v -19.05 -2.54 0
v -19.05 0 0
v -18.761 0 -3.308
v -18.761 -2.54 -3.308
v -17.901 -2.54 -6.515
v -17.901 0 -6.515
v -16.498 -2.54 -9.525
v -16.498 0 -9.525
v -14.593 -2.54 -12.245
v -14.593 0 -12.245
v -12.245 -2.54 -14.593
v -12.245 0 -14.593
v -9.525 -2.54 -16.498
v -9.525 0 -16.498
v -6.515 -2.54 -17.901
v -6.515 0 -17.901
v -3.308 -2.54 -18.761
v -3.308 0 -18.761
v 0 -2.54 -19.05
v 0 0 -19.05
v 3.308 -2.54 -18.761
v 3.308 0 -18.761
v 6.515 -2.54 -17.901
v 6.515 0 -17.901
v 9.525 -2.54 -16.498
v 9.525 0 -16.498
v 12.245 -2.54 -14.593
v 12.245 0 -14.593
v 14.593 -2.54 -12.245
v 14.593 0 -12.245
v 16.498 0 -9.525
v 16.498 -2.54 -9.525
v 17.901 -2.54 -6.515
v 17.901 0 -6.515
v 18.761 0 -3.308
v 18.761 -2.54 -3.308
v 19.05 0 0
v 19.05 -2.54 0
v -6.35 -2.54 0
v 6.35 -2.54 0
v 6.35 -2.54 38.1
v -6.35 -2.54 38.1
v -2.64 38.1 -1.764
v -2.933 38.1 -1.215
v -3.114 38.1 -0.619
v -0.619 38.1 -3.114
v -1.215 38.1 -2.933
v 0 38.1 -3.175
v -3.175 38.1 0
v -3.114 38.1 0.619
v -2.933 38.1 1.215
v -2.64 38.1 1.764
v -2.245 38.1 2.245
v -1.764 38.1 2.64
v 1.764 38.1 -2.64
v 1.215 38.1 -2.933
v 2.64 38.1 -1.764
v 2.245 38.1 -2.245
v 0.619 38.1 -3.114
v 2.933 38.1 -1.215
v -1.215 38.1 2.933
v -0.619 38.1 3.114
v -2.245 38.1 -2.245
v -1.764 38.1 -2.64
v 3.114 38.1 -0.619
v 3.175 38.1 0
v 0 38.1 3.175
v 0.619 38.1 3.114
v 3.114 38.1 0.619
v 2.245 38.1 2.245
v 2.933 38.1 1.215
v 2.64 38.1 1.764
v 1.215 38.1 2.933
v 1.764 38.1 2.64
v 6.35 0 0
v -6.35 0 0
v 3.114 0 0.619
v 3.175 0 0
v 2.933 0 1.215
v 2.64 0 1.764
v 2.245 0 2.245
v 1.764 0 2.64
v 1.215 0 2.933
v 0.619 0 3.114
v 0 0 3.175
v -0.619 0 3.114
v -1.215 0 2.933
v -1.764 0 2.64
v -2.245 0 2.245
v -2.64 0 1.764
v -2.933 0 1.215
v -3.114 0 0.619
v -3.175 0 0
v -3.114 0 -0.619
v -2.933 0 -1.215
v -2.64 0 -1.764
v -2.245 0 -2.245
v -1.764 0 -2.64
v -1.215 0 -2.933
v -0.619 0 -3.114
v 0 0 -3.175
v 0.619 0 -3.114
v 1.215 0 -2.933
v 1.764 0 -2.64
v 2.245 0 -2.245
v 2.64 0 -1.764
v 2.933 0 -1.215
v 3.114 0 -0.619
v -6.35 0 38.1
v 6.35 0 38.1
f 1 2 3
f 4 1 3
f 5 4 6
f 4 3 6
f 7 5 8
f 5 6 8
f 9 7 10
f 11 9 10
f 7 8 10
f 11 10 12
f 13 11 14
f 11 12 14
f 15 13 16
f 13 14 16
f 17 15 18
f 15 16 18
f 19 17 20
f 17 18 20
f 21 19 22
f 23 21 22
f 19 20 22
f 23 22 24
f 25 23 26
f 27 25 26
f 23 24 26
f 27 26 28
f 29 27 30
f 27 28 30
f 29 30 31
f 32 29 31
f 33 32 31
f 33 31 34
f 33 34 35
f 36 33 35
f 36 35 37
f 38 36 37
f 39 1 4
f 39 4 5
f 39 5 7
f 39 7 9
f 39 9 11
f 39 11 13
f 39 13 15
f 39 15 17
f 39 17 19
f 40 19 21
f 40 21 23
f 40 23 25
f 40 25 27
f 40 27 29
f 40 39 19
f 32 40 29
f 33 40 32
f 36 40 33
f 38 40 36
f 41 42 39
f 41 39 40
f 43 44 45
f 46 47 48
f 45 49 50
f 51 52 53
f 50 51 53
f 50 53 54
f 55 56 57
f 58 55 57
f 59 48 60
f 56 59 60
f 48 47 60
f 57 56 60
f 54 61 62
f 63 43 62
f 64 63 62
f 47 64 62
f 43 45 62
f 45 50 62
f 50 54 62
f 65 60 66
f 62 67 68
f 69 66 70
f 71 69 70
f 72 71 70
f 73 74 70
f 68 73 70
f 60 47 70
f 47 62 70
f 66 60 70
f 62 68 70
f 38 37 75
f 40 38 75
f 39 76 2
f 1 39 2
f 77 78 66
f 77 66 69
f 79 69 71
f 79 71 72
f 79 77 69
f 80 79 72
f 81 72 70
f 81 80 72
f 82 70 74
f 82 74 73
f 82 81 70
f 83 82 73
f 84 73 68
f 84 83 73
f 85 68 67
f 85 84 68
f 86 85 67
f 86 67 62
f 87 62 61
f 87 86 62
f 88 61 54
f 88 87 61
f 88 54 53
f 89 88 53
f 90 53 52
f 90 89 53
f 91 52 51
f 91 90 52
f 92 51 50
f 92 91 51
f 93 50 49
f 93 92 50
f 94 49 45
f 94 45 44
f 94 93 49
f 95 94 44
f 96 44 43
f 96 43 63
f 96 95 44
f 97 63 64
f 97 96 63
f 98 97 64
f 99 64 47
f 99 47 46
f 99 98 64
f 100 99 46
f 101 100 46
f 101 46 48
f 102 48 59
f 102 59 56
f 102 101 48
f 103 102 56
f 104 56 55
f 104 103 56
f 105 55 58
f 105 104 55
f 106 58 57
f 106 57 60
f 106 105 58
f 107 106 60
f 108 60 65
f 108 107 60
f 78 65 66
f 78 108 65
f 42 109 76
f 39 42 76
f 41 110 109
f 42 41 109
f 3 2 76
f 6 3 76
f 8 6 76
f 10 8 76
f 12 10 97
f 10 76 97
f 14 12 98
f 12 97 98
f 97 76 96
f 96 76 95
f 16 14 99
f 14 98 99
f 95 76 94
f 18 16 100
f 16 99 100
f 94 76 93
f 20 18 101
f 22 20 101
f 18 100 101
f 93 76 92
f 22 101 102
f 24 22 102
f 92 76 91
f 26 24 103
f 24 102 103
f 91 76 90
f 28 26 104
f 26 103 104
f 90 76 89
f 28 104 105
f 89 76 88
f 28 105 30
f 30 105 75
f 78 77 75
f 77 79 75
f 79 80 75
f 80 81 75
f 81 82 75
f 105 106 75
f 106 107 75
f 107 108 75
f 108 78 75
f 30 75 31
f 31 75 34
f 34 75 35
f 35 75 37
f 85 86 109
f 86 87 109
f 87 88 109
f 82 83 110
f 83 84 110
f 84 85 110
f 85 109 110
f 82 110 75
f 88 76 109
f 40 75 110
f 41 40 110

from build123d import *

# Parameters (mm, degrees)
F0_R     = 3.175
F1_DEPTH = 38.1
F3_DEPTH = 2.54


with BuildPart() as f1:
    # F0 (on Front) → F1 (new body)
    with BuildSketch(Plane.XZ):
        Circle(F0_R)
    extrude(amount=-F1_DEPTH)

    # F2 (on face) → F3 (join)
    with BuildSketch(Plane.XZ):
        with BuildLine():
            Line((-6.35, 0), (-19.05, 0))
            ThreePointArc((-19.05, 0), (0, -19.05), (19.05, 0))
            Line((19.05, 0), (6.35, 0))
            Line((6.35, 0), (6.35, 38.1))
            Line((6.35, 38.1), (-6.35, 38.1))
            Line((-6.35, 38.1), (-6.35, 0))
        make_face()
    extrude(amount=F3_DEPTH)


solid = f1.part
